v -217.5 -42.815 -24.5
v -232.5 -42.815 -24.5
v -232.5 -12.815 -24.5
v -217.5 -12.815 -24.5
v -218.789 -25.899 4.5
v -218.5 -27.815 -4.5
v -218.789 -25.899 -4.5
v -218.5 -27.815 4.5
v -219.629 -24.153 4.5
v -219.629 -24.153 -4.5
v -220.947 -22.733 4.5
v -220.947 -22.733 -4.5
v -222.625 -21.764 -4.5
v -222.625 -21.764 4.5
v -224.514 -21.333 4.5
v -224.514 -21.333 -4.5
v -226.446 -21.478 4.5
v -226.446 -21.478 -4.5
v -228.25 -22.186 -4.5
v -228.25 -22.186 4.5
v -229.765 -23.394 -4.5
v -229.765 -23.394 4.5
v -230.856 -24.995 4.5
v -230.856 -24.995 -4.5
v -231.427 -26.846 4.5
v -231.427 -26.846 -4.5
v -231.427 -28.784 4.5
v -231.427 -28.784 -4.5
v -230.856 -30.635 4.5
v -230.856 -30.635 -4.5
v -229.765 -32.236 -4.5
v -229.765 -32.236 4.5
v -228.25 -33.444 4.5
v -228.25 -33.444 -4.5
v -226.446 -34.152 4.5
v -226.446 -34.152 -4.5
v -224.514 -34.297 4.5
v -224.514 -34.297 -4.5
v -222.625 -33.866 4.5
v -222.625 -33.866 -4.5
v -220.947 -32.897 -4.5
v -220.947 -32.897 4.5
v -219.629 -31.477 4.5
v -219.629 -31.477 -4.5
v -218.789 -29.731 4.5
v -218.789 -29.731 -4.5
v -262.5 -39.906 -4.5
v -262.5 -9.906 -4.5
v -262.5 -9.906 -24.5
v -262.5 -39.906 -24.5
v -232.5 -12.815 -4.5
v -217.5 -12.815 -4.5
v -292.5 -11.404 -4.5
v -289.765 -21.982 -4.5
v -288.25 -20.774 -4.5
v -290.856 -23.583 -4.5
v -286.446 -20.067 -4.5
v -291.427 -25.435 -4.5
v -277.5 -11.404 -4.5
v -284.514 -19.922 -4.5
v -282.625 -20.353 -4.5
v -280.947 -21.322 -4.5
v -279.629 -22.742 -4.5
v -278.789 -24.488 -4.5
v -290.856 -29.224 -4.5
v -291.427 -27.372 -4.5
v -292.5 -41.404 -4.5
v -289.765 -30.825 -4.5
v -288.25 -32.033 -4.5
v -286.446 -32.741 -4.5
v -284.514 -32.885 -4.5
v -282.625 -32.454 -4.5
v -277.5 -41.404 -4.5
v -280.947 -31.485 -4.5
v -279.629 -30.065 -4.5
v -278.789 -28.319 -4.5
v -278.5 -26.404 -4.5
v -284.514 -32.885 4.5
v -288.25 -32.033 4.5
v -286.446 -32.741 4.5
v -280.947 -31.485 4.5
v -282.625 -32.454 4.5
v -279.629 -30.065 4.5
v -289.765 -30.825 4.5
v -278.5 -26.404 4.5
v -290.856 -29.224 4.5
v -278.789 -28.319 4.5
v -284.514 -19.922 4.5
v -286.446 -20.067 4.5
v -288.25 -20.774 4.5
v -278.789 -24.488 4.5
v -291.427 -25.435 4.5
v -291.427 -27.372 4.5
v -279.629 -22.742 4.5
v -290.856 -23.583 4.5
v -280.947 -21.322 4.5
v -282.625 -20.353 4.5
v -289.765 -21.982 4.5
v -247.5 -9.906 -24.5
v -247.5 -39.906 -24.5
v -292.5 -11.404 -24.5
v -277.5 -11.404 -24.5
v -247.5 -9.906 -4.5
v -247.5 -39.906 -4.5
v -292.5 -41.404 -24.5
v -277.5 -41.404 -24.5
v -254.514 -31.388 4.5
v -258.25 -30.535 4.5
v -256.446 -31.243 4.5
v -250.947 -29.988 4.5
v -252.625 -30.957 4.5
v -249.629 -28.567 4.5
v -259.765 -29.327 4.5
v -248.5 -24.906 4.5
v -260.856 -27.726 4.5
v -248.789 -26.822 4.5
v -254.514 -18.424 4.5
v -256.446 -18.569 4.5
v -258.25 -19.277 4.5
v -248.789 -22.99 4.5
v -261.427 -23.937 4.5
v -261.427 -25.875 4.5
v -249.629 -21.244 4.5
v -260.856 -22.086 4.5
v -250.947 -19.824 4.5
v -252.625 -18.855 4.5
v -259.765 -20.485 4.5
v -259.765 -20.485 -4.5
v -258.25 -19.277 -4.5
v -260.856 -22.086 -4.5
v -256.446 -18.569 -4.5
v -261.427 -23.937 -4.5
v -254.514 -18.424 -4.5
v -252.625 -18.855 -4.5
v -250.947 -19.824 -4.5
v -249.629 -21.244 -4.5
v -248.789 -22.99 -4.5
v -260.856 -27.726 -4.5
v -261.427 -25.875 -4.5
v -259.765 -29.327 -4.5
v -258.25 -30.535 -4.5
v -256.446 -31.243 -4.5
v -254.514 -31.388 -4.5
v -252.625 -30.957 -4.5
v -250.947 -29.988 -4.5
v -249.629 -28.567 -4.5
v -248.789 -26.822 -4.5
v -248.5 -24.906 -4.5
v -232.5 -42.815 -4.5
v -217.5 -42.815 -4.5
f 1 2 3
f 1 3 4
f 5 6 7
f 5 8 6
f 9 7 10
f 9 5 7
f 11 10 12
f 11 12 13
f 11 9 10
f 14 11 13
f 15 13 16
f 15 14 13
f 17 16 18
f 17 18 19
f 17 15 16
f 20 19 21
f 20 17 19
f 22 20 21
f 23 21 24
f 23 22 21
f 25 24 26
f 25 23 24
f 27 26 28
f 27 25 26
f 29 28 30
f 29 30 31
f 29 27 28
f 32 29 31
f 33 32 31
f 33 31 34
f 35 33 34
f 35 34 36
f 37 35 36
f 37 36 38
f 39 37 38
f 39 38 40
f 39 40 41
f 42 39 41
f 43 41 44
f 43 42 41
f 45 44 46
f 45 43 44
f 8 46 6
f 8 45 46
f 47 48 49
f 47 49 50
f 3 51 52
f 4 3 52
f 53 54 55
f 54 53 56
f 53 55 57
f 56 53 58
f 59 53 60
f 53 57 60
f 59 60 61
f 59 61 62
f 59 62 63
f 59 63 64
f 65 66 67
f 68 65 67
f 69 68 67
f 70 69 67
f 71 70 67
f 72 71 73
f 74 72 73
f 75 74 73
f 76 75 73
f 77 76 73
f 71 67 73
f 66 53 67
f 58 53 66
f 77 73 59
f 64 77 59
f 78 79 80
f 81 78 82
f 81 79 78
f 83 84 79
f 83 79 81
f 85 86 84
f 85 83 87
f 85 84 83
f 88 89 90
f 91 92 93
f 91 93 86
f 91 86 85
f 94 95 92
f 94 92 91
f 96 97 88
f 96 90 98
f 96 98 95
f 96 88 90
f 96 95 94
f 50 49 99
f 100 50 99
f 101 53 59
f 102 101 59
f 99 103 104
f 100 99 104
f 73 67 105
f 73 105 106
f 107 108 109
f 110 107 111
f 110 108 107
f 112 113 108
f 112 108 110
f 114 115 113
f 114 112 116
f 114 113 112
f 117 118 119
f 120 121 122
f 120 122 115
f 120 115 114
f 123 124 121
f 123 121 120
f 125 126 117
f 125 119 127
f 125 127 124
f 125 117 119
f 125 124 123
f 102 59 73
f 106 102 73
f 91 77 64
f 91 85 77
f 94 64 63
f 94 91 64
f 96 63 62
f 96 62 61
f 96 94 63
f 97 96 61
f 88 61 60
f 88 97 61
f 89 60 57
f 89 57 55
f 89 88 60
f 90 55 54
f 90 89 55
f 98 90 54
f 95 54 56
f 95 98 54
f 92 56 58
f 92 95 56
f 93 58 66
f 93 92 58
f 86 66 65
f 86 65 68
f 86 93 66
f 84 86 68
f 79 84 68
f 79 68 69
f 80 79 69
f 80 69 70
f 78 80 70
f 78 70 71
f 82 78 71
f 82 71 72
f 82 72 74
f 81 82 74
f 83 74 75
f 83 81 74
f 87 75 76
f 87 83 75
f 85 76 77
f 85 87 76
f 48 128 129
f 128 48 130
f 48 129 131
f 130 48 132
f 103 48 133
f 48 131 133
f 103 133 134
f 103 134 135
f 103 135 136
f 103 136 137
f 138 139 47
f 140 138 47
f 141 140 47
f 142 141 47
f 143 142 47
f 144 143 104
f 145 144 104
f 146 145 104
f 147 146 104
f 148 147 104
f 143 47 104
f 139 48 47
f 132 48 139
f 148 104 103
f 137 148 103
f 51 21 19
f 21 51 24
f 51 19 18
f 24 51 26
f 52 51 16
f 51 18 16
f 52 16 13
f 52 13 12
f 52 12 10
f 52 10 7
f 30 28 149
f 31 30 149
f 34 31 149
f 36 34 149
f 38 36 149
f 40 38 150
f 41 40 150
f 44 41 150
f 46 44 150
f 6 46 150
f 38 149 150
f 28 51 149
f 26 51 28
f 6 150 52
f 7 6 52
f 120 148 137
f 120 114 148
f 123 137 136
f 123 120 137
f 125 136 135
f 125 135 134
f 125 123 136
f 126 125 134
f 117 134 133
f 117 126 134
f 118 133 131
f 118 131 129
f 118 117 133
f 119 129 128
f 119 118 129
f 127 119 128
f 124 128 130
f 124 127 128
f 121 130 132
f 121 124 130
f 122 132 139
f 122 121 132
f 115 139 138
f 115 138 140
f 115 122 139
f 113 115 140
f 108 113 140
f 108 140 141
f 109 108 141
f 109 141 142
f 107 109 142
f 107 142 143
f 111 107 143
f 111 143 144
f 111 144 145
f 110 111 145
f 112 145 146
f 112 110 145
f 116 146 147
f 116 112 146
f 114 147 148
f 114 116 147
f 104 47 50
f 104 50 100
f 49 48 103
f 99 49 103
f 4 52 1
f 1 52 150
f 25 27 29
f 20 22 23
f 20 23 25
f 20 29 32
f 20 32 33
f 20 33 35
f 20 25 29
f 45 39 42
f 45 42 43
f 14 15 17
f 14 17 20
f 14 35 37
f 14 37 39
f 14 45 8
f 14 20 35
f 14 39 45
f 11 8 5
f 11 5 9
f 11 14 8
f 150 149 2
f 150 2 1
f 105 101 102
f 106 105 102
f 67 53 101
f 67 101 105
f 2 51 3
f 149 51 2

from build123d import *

# Parameters (mm, degrees)
F0_R     = 6.5
F1_DEPTH = 4.5
F2_DEPTH = 4.5
F3_W     = 15
F3_H     = 30
F3_R     = 6.5
F4_W     = 15
F4_H     = 30
F4_R     = 6.5
F5_W     = 15
F5_H     = 30
F6_DEPTH = 20


with BuildPart() as f1:
    # F0 (on Top) → F1 (new body)
    with BuildSketch(Plane.XY):
        with Locations((-285, -26.403591)):
            Circle(F0_R)
        with Locations((-255, -24.90591)):
            Circle(F0_R)
        with Locations((-225, -27.815034)):
            Circle(F0_R)
    extrude(amount=F1_DEPTH)

    # F0 (on Top) → F2 (join)
    with BuildSketch(Plane.XY):
        with Locations((-225, -27.815034)):
            Circle(F0_R)
        with Locations((-255, -24.90591)):
            Circle(F0_R)
        with Locations((-285, -26.403591)):
            Circle(F0_R)
    extrude(amount=-F2_DEPTH)

    # F3 (on face) + F4 (on face) + F5 (on face) → F6 (join)
    with BuildSketch(Plane(origin=(0, 0, -4.5), x_dir=(1, 0, 0), z_dir=(0, 0, -1))):
        with Locations((-285, 26.403591)):
            Rectangle(F3_W, F3_H)
        with Locations((-285, 26.403591)):
            Circle(F3_R)
    with BuildSketch(Plane(origin=(0, 0, -4.5), x_dir=(1, 0, 0), z_dir=(0, 0, -1))):
        with Locations((-255, 24.90591)):
            Rectangle(F4_W, F4_H)
        with Locations((-255, 24.90591)):
            Circle(F4_R)
    with BuildSketch(Plane(origin=(0, 0, -4.5), x_dir=(1, 0, 0), z_dir=(0, 0, -1))):
        with Locations((-225, 27.815034)):
            Rectangle(F5_W, F5_H)
    extrude(amount=F6_DEPTH)


solid = f1.part
